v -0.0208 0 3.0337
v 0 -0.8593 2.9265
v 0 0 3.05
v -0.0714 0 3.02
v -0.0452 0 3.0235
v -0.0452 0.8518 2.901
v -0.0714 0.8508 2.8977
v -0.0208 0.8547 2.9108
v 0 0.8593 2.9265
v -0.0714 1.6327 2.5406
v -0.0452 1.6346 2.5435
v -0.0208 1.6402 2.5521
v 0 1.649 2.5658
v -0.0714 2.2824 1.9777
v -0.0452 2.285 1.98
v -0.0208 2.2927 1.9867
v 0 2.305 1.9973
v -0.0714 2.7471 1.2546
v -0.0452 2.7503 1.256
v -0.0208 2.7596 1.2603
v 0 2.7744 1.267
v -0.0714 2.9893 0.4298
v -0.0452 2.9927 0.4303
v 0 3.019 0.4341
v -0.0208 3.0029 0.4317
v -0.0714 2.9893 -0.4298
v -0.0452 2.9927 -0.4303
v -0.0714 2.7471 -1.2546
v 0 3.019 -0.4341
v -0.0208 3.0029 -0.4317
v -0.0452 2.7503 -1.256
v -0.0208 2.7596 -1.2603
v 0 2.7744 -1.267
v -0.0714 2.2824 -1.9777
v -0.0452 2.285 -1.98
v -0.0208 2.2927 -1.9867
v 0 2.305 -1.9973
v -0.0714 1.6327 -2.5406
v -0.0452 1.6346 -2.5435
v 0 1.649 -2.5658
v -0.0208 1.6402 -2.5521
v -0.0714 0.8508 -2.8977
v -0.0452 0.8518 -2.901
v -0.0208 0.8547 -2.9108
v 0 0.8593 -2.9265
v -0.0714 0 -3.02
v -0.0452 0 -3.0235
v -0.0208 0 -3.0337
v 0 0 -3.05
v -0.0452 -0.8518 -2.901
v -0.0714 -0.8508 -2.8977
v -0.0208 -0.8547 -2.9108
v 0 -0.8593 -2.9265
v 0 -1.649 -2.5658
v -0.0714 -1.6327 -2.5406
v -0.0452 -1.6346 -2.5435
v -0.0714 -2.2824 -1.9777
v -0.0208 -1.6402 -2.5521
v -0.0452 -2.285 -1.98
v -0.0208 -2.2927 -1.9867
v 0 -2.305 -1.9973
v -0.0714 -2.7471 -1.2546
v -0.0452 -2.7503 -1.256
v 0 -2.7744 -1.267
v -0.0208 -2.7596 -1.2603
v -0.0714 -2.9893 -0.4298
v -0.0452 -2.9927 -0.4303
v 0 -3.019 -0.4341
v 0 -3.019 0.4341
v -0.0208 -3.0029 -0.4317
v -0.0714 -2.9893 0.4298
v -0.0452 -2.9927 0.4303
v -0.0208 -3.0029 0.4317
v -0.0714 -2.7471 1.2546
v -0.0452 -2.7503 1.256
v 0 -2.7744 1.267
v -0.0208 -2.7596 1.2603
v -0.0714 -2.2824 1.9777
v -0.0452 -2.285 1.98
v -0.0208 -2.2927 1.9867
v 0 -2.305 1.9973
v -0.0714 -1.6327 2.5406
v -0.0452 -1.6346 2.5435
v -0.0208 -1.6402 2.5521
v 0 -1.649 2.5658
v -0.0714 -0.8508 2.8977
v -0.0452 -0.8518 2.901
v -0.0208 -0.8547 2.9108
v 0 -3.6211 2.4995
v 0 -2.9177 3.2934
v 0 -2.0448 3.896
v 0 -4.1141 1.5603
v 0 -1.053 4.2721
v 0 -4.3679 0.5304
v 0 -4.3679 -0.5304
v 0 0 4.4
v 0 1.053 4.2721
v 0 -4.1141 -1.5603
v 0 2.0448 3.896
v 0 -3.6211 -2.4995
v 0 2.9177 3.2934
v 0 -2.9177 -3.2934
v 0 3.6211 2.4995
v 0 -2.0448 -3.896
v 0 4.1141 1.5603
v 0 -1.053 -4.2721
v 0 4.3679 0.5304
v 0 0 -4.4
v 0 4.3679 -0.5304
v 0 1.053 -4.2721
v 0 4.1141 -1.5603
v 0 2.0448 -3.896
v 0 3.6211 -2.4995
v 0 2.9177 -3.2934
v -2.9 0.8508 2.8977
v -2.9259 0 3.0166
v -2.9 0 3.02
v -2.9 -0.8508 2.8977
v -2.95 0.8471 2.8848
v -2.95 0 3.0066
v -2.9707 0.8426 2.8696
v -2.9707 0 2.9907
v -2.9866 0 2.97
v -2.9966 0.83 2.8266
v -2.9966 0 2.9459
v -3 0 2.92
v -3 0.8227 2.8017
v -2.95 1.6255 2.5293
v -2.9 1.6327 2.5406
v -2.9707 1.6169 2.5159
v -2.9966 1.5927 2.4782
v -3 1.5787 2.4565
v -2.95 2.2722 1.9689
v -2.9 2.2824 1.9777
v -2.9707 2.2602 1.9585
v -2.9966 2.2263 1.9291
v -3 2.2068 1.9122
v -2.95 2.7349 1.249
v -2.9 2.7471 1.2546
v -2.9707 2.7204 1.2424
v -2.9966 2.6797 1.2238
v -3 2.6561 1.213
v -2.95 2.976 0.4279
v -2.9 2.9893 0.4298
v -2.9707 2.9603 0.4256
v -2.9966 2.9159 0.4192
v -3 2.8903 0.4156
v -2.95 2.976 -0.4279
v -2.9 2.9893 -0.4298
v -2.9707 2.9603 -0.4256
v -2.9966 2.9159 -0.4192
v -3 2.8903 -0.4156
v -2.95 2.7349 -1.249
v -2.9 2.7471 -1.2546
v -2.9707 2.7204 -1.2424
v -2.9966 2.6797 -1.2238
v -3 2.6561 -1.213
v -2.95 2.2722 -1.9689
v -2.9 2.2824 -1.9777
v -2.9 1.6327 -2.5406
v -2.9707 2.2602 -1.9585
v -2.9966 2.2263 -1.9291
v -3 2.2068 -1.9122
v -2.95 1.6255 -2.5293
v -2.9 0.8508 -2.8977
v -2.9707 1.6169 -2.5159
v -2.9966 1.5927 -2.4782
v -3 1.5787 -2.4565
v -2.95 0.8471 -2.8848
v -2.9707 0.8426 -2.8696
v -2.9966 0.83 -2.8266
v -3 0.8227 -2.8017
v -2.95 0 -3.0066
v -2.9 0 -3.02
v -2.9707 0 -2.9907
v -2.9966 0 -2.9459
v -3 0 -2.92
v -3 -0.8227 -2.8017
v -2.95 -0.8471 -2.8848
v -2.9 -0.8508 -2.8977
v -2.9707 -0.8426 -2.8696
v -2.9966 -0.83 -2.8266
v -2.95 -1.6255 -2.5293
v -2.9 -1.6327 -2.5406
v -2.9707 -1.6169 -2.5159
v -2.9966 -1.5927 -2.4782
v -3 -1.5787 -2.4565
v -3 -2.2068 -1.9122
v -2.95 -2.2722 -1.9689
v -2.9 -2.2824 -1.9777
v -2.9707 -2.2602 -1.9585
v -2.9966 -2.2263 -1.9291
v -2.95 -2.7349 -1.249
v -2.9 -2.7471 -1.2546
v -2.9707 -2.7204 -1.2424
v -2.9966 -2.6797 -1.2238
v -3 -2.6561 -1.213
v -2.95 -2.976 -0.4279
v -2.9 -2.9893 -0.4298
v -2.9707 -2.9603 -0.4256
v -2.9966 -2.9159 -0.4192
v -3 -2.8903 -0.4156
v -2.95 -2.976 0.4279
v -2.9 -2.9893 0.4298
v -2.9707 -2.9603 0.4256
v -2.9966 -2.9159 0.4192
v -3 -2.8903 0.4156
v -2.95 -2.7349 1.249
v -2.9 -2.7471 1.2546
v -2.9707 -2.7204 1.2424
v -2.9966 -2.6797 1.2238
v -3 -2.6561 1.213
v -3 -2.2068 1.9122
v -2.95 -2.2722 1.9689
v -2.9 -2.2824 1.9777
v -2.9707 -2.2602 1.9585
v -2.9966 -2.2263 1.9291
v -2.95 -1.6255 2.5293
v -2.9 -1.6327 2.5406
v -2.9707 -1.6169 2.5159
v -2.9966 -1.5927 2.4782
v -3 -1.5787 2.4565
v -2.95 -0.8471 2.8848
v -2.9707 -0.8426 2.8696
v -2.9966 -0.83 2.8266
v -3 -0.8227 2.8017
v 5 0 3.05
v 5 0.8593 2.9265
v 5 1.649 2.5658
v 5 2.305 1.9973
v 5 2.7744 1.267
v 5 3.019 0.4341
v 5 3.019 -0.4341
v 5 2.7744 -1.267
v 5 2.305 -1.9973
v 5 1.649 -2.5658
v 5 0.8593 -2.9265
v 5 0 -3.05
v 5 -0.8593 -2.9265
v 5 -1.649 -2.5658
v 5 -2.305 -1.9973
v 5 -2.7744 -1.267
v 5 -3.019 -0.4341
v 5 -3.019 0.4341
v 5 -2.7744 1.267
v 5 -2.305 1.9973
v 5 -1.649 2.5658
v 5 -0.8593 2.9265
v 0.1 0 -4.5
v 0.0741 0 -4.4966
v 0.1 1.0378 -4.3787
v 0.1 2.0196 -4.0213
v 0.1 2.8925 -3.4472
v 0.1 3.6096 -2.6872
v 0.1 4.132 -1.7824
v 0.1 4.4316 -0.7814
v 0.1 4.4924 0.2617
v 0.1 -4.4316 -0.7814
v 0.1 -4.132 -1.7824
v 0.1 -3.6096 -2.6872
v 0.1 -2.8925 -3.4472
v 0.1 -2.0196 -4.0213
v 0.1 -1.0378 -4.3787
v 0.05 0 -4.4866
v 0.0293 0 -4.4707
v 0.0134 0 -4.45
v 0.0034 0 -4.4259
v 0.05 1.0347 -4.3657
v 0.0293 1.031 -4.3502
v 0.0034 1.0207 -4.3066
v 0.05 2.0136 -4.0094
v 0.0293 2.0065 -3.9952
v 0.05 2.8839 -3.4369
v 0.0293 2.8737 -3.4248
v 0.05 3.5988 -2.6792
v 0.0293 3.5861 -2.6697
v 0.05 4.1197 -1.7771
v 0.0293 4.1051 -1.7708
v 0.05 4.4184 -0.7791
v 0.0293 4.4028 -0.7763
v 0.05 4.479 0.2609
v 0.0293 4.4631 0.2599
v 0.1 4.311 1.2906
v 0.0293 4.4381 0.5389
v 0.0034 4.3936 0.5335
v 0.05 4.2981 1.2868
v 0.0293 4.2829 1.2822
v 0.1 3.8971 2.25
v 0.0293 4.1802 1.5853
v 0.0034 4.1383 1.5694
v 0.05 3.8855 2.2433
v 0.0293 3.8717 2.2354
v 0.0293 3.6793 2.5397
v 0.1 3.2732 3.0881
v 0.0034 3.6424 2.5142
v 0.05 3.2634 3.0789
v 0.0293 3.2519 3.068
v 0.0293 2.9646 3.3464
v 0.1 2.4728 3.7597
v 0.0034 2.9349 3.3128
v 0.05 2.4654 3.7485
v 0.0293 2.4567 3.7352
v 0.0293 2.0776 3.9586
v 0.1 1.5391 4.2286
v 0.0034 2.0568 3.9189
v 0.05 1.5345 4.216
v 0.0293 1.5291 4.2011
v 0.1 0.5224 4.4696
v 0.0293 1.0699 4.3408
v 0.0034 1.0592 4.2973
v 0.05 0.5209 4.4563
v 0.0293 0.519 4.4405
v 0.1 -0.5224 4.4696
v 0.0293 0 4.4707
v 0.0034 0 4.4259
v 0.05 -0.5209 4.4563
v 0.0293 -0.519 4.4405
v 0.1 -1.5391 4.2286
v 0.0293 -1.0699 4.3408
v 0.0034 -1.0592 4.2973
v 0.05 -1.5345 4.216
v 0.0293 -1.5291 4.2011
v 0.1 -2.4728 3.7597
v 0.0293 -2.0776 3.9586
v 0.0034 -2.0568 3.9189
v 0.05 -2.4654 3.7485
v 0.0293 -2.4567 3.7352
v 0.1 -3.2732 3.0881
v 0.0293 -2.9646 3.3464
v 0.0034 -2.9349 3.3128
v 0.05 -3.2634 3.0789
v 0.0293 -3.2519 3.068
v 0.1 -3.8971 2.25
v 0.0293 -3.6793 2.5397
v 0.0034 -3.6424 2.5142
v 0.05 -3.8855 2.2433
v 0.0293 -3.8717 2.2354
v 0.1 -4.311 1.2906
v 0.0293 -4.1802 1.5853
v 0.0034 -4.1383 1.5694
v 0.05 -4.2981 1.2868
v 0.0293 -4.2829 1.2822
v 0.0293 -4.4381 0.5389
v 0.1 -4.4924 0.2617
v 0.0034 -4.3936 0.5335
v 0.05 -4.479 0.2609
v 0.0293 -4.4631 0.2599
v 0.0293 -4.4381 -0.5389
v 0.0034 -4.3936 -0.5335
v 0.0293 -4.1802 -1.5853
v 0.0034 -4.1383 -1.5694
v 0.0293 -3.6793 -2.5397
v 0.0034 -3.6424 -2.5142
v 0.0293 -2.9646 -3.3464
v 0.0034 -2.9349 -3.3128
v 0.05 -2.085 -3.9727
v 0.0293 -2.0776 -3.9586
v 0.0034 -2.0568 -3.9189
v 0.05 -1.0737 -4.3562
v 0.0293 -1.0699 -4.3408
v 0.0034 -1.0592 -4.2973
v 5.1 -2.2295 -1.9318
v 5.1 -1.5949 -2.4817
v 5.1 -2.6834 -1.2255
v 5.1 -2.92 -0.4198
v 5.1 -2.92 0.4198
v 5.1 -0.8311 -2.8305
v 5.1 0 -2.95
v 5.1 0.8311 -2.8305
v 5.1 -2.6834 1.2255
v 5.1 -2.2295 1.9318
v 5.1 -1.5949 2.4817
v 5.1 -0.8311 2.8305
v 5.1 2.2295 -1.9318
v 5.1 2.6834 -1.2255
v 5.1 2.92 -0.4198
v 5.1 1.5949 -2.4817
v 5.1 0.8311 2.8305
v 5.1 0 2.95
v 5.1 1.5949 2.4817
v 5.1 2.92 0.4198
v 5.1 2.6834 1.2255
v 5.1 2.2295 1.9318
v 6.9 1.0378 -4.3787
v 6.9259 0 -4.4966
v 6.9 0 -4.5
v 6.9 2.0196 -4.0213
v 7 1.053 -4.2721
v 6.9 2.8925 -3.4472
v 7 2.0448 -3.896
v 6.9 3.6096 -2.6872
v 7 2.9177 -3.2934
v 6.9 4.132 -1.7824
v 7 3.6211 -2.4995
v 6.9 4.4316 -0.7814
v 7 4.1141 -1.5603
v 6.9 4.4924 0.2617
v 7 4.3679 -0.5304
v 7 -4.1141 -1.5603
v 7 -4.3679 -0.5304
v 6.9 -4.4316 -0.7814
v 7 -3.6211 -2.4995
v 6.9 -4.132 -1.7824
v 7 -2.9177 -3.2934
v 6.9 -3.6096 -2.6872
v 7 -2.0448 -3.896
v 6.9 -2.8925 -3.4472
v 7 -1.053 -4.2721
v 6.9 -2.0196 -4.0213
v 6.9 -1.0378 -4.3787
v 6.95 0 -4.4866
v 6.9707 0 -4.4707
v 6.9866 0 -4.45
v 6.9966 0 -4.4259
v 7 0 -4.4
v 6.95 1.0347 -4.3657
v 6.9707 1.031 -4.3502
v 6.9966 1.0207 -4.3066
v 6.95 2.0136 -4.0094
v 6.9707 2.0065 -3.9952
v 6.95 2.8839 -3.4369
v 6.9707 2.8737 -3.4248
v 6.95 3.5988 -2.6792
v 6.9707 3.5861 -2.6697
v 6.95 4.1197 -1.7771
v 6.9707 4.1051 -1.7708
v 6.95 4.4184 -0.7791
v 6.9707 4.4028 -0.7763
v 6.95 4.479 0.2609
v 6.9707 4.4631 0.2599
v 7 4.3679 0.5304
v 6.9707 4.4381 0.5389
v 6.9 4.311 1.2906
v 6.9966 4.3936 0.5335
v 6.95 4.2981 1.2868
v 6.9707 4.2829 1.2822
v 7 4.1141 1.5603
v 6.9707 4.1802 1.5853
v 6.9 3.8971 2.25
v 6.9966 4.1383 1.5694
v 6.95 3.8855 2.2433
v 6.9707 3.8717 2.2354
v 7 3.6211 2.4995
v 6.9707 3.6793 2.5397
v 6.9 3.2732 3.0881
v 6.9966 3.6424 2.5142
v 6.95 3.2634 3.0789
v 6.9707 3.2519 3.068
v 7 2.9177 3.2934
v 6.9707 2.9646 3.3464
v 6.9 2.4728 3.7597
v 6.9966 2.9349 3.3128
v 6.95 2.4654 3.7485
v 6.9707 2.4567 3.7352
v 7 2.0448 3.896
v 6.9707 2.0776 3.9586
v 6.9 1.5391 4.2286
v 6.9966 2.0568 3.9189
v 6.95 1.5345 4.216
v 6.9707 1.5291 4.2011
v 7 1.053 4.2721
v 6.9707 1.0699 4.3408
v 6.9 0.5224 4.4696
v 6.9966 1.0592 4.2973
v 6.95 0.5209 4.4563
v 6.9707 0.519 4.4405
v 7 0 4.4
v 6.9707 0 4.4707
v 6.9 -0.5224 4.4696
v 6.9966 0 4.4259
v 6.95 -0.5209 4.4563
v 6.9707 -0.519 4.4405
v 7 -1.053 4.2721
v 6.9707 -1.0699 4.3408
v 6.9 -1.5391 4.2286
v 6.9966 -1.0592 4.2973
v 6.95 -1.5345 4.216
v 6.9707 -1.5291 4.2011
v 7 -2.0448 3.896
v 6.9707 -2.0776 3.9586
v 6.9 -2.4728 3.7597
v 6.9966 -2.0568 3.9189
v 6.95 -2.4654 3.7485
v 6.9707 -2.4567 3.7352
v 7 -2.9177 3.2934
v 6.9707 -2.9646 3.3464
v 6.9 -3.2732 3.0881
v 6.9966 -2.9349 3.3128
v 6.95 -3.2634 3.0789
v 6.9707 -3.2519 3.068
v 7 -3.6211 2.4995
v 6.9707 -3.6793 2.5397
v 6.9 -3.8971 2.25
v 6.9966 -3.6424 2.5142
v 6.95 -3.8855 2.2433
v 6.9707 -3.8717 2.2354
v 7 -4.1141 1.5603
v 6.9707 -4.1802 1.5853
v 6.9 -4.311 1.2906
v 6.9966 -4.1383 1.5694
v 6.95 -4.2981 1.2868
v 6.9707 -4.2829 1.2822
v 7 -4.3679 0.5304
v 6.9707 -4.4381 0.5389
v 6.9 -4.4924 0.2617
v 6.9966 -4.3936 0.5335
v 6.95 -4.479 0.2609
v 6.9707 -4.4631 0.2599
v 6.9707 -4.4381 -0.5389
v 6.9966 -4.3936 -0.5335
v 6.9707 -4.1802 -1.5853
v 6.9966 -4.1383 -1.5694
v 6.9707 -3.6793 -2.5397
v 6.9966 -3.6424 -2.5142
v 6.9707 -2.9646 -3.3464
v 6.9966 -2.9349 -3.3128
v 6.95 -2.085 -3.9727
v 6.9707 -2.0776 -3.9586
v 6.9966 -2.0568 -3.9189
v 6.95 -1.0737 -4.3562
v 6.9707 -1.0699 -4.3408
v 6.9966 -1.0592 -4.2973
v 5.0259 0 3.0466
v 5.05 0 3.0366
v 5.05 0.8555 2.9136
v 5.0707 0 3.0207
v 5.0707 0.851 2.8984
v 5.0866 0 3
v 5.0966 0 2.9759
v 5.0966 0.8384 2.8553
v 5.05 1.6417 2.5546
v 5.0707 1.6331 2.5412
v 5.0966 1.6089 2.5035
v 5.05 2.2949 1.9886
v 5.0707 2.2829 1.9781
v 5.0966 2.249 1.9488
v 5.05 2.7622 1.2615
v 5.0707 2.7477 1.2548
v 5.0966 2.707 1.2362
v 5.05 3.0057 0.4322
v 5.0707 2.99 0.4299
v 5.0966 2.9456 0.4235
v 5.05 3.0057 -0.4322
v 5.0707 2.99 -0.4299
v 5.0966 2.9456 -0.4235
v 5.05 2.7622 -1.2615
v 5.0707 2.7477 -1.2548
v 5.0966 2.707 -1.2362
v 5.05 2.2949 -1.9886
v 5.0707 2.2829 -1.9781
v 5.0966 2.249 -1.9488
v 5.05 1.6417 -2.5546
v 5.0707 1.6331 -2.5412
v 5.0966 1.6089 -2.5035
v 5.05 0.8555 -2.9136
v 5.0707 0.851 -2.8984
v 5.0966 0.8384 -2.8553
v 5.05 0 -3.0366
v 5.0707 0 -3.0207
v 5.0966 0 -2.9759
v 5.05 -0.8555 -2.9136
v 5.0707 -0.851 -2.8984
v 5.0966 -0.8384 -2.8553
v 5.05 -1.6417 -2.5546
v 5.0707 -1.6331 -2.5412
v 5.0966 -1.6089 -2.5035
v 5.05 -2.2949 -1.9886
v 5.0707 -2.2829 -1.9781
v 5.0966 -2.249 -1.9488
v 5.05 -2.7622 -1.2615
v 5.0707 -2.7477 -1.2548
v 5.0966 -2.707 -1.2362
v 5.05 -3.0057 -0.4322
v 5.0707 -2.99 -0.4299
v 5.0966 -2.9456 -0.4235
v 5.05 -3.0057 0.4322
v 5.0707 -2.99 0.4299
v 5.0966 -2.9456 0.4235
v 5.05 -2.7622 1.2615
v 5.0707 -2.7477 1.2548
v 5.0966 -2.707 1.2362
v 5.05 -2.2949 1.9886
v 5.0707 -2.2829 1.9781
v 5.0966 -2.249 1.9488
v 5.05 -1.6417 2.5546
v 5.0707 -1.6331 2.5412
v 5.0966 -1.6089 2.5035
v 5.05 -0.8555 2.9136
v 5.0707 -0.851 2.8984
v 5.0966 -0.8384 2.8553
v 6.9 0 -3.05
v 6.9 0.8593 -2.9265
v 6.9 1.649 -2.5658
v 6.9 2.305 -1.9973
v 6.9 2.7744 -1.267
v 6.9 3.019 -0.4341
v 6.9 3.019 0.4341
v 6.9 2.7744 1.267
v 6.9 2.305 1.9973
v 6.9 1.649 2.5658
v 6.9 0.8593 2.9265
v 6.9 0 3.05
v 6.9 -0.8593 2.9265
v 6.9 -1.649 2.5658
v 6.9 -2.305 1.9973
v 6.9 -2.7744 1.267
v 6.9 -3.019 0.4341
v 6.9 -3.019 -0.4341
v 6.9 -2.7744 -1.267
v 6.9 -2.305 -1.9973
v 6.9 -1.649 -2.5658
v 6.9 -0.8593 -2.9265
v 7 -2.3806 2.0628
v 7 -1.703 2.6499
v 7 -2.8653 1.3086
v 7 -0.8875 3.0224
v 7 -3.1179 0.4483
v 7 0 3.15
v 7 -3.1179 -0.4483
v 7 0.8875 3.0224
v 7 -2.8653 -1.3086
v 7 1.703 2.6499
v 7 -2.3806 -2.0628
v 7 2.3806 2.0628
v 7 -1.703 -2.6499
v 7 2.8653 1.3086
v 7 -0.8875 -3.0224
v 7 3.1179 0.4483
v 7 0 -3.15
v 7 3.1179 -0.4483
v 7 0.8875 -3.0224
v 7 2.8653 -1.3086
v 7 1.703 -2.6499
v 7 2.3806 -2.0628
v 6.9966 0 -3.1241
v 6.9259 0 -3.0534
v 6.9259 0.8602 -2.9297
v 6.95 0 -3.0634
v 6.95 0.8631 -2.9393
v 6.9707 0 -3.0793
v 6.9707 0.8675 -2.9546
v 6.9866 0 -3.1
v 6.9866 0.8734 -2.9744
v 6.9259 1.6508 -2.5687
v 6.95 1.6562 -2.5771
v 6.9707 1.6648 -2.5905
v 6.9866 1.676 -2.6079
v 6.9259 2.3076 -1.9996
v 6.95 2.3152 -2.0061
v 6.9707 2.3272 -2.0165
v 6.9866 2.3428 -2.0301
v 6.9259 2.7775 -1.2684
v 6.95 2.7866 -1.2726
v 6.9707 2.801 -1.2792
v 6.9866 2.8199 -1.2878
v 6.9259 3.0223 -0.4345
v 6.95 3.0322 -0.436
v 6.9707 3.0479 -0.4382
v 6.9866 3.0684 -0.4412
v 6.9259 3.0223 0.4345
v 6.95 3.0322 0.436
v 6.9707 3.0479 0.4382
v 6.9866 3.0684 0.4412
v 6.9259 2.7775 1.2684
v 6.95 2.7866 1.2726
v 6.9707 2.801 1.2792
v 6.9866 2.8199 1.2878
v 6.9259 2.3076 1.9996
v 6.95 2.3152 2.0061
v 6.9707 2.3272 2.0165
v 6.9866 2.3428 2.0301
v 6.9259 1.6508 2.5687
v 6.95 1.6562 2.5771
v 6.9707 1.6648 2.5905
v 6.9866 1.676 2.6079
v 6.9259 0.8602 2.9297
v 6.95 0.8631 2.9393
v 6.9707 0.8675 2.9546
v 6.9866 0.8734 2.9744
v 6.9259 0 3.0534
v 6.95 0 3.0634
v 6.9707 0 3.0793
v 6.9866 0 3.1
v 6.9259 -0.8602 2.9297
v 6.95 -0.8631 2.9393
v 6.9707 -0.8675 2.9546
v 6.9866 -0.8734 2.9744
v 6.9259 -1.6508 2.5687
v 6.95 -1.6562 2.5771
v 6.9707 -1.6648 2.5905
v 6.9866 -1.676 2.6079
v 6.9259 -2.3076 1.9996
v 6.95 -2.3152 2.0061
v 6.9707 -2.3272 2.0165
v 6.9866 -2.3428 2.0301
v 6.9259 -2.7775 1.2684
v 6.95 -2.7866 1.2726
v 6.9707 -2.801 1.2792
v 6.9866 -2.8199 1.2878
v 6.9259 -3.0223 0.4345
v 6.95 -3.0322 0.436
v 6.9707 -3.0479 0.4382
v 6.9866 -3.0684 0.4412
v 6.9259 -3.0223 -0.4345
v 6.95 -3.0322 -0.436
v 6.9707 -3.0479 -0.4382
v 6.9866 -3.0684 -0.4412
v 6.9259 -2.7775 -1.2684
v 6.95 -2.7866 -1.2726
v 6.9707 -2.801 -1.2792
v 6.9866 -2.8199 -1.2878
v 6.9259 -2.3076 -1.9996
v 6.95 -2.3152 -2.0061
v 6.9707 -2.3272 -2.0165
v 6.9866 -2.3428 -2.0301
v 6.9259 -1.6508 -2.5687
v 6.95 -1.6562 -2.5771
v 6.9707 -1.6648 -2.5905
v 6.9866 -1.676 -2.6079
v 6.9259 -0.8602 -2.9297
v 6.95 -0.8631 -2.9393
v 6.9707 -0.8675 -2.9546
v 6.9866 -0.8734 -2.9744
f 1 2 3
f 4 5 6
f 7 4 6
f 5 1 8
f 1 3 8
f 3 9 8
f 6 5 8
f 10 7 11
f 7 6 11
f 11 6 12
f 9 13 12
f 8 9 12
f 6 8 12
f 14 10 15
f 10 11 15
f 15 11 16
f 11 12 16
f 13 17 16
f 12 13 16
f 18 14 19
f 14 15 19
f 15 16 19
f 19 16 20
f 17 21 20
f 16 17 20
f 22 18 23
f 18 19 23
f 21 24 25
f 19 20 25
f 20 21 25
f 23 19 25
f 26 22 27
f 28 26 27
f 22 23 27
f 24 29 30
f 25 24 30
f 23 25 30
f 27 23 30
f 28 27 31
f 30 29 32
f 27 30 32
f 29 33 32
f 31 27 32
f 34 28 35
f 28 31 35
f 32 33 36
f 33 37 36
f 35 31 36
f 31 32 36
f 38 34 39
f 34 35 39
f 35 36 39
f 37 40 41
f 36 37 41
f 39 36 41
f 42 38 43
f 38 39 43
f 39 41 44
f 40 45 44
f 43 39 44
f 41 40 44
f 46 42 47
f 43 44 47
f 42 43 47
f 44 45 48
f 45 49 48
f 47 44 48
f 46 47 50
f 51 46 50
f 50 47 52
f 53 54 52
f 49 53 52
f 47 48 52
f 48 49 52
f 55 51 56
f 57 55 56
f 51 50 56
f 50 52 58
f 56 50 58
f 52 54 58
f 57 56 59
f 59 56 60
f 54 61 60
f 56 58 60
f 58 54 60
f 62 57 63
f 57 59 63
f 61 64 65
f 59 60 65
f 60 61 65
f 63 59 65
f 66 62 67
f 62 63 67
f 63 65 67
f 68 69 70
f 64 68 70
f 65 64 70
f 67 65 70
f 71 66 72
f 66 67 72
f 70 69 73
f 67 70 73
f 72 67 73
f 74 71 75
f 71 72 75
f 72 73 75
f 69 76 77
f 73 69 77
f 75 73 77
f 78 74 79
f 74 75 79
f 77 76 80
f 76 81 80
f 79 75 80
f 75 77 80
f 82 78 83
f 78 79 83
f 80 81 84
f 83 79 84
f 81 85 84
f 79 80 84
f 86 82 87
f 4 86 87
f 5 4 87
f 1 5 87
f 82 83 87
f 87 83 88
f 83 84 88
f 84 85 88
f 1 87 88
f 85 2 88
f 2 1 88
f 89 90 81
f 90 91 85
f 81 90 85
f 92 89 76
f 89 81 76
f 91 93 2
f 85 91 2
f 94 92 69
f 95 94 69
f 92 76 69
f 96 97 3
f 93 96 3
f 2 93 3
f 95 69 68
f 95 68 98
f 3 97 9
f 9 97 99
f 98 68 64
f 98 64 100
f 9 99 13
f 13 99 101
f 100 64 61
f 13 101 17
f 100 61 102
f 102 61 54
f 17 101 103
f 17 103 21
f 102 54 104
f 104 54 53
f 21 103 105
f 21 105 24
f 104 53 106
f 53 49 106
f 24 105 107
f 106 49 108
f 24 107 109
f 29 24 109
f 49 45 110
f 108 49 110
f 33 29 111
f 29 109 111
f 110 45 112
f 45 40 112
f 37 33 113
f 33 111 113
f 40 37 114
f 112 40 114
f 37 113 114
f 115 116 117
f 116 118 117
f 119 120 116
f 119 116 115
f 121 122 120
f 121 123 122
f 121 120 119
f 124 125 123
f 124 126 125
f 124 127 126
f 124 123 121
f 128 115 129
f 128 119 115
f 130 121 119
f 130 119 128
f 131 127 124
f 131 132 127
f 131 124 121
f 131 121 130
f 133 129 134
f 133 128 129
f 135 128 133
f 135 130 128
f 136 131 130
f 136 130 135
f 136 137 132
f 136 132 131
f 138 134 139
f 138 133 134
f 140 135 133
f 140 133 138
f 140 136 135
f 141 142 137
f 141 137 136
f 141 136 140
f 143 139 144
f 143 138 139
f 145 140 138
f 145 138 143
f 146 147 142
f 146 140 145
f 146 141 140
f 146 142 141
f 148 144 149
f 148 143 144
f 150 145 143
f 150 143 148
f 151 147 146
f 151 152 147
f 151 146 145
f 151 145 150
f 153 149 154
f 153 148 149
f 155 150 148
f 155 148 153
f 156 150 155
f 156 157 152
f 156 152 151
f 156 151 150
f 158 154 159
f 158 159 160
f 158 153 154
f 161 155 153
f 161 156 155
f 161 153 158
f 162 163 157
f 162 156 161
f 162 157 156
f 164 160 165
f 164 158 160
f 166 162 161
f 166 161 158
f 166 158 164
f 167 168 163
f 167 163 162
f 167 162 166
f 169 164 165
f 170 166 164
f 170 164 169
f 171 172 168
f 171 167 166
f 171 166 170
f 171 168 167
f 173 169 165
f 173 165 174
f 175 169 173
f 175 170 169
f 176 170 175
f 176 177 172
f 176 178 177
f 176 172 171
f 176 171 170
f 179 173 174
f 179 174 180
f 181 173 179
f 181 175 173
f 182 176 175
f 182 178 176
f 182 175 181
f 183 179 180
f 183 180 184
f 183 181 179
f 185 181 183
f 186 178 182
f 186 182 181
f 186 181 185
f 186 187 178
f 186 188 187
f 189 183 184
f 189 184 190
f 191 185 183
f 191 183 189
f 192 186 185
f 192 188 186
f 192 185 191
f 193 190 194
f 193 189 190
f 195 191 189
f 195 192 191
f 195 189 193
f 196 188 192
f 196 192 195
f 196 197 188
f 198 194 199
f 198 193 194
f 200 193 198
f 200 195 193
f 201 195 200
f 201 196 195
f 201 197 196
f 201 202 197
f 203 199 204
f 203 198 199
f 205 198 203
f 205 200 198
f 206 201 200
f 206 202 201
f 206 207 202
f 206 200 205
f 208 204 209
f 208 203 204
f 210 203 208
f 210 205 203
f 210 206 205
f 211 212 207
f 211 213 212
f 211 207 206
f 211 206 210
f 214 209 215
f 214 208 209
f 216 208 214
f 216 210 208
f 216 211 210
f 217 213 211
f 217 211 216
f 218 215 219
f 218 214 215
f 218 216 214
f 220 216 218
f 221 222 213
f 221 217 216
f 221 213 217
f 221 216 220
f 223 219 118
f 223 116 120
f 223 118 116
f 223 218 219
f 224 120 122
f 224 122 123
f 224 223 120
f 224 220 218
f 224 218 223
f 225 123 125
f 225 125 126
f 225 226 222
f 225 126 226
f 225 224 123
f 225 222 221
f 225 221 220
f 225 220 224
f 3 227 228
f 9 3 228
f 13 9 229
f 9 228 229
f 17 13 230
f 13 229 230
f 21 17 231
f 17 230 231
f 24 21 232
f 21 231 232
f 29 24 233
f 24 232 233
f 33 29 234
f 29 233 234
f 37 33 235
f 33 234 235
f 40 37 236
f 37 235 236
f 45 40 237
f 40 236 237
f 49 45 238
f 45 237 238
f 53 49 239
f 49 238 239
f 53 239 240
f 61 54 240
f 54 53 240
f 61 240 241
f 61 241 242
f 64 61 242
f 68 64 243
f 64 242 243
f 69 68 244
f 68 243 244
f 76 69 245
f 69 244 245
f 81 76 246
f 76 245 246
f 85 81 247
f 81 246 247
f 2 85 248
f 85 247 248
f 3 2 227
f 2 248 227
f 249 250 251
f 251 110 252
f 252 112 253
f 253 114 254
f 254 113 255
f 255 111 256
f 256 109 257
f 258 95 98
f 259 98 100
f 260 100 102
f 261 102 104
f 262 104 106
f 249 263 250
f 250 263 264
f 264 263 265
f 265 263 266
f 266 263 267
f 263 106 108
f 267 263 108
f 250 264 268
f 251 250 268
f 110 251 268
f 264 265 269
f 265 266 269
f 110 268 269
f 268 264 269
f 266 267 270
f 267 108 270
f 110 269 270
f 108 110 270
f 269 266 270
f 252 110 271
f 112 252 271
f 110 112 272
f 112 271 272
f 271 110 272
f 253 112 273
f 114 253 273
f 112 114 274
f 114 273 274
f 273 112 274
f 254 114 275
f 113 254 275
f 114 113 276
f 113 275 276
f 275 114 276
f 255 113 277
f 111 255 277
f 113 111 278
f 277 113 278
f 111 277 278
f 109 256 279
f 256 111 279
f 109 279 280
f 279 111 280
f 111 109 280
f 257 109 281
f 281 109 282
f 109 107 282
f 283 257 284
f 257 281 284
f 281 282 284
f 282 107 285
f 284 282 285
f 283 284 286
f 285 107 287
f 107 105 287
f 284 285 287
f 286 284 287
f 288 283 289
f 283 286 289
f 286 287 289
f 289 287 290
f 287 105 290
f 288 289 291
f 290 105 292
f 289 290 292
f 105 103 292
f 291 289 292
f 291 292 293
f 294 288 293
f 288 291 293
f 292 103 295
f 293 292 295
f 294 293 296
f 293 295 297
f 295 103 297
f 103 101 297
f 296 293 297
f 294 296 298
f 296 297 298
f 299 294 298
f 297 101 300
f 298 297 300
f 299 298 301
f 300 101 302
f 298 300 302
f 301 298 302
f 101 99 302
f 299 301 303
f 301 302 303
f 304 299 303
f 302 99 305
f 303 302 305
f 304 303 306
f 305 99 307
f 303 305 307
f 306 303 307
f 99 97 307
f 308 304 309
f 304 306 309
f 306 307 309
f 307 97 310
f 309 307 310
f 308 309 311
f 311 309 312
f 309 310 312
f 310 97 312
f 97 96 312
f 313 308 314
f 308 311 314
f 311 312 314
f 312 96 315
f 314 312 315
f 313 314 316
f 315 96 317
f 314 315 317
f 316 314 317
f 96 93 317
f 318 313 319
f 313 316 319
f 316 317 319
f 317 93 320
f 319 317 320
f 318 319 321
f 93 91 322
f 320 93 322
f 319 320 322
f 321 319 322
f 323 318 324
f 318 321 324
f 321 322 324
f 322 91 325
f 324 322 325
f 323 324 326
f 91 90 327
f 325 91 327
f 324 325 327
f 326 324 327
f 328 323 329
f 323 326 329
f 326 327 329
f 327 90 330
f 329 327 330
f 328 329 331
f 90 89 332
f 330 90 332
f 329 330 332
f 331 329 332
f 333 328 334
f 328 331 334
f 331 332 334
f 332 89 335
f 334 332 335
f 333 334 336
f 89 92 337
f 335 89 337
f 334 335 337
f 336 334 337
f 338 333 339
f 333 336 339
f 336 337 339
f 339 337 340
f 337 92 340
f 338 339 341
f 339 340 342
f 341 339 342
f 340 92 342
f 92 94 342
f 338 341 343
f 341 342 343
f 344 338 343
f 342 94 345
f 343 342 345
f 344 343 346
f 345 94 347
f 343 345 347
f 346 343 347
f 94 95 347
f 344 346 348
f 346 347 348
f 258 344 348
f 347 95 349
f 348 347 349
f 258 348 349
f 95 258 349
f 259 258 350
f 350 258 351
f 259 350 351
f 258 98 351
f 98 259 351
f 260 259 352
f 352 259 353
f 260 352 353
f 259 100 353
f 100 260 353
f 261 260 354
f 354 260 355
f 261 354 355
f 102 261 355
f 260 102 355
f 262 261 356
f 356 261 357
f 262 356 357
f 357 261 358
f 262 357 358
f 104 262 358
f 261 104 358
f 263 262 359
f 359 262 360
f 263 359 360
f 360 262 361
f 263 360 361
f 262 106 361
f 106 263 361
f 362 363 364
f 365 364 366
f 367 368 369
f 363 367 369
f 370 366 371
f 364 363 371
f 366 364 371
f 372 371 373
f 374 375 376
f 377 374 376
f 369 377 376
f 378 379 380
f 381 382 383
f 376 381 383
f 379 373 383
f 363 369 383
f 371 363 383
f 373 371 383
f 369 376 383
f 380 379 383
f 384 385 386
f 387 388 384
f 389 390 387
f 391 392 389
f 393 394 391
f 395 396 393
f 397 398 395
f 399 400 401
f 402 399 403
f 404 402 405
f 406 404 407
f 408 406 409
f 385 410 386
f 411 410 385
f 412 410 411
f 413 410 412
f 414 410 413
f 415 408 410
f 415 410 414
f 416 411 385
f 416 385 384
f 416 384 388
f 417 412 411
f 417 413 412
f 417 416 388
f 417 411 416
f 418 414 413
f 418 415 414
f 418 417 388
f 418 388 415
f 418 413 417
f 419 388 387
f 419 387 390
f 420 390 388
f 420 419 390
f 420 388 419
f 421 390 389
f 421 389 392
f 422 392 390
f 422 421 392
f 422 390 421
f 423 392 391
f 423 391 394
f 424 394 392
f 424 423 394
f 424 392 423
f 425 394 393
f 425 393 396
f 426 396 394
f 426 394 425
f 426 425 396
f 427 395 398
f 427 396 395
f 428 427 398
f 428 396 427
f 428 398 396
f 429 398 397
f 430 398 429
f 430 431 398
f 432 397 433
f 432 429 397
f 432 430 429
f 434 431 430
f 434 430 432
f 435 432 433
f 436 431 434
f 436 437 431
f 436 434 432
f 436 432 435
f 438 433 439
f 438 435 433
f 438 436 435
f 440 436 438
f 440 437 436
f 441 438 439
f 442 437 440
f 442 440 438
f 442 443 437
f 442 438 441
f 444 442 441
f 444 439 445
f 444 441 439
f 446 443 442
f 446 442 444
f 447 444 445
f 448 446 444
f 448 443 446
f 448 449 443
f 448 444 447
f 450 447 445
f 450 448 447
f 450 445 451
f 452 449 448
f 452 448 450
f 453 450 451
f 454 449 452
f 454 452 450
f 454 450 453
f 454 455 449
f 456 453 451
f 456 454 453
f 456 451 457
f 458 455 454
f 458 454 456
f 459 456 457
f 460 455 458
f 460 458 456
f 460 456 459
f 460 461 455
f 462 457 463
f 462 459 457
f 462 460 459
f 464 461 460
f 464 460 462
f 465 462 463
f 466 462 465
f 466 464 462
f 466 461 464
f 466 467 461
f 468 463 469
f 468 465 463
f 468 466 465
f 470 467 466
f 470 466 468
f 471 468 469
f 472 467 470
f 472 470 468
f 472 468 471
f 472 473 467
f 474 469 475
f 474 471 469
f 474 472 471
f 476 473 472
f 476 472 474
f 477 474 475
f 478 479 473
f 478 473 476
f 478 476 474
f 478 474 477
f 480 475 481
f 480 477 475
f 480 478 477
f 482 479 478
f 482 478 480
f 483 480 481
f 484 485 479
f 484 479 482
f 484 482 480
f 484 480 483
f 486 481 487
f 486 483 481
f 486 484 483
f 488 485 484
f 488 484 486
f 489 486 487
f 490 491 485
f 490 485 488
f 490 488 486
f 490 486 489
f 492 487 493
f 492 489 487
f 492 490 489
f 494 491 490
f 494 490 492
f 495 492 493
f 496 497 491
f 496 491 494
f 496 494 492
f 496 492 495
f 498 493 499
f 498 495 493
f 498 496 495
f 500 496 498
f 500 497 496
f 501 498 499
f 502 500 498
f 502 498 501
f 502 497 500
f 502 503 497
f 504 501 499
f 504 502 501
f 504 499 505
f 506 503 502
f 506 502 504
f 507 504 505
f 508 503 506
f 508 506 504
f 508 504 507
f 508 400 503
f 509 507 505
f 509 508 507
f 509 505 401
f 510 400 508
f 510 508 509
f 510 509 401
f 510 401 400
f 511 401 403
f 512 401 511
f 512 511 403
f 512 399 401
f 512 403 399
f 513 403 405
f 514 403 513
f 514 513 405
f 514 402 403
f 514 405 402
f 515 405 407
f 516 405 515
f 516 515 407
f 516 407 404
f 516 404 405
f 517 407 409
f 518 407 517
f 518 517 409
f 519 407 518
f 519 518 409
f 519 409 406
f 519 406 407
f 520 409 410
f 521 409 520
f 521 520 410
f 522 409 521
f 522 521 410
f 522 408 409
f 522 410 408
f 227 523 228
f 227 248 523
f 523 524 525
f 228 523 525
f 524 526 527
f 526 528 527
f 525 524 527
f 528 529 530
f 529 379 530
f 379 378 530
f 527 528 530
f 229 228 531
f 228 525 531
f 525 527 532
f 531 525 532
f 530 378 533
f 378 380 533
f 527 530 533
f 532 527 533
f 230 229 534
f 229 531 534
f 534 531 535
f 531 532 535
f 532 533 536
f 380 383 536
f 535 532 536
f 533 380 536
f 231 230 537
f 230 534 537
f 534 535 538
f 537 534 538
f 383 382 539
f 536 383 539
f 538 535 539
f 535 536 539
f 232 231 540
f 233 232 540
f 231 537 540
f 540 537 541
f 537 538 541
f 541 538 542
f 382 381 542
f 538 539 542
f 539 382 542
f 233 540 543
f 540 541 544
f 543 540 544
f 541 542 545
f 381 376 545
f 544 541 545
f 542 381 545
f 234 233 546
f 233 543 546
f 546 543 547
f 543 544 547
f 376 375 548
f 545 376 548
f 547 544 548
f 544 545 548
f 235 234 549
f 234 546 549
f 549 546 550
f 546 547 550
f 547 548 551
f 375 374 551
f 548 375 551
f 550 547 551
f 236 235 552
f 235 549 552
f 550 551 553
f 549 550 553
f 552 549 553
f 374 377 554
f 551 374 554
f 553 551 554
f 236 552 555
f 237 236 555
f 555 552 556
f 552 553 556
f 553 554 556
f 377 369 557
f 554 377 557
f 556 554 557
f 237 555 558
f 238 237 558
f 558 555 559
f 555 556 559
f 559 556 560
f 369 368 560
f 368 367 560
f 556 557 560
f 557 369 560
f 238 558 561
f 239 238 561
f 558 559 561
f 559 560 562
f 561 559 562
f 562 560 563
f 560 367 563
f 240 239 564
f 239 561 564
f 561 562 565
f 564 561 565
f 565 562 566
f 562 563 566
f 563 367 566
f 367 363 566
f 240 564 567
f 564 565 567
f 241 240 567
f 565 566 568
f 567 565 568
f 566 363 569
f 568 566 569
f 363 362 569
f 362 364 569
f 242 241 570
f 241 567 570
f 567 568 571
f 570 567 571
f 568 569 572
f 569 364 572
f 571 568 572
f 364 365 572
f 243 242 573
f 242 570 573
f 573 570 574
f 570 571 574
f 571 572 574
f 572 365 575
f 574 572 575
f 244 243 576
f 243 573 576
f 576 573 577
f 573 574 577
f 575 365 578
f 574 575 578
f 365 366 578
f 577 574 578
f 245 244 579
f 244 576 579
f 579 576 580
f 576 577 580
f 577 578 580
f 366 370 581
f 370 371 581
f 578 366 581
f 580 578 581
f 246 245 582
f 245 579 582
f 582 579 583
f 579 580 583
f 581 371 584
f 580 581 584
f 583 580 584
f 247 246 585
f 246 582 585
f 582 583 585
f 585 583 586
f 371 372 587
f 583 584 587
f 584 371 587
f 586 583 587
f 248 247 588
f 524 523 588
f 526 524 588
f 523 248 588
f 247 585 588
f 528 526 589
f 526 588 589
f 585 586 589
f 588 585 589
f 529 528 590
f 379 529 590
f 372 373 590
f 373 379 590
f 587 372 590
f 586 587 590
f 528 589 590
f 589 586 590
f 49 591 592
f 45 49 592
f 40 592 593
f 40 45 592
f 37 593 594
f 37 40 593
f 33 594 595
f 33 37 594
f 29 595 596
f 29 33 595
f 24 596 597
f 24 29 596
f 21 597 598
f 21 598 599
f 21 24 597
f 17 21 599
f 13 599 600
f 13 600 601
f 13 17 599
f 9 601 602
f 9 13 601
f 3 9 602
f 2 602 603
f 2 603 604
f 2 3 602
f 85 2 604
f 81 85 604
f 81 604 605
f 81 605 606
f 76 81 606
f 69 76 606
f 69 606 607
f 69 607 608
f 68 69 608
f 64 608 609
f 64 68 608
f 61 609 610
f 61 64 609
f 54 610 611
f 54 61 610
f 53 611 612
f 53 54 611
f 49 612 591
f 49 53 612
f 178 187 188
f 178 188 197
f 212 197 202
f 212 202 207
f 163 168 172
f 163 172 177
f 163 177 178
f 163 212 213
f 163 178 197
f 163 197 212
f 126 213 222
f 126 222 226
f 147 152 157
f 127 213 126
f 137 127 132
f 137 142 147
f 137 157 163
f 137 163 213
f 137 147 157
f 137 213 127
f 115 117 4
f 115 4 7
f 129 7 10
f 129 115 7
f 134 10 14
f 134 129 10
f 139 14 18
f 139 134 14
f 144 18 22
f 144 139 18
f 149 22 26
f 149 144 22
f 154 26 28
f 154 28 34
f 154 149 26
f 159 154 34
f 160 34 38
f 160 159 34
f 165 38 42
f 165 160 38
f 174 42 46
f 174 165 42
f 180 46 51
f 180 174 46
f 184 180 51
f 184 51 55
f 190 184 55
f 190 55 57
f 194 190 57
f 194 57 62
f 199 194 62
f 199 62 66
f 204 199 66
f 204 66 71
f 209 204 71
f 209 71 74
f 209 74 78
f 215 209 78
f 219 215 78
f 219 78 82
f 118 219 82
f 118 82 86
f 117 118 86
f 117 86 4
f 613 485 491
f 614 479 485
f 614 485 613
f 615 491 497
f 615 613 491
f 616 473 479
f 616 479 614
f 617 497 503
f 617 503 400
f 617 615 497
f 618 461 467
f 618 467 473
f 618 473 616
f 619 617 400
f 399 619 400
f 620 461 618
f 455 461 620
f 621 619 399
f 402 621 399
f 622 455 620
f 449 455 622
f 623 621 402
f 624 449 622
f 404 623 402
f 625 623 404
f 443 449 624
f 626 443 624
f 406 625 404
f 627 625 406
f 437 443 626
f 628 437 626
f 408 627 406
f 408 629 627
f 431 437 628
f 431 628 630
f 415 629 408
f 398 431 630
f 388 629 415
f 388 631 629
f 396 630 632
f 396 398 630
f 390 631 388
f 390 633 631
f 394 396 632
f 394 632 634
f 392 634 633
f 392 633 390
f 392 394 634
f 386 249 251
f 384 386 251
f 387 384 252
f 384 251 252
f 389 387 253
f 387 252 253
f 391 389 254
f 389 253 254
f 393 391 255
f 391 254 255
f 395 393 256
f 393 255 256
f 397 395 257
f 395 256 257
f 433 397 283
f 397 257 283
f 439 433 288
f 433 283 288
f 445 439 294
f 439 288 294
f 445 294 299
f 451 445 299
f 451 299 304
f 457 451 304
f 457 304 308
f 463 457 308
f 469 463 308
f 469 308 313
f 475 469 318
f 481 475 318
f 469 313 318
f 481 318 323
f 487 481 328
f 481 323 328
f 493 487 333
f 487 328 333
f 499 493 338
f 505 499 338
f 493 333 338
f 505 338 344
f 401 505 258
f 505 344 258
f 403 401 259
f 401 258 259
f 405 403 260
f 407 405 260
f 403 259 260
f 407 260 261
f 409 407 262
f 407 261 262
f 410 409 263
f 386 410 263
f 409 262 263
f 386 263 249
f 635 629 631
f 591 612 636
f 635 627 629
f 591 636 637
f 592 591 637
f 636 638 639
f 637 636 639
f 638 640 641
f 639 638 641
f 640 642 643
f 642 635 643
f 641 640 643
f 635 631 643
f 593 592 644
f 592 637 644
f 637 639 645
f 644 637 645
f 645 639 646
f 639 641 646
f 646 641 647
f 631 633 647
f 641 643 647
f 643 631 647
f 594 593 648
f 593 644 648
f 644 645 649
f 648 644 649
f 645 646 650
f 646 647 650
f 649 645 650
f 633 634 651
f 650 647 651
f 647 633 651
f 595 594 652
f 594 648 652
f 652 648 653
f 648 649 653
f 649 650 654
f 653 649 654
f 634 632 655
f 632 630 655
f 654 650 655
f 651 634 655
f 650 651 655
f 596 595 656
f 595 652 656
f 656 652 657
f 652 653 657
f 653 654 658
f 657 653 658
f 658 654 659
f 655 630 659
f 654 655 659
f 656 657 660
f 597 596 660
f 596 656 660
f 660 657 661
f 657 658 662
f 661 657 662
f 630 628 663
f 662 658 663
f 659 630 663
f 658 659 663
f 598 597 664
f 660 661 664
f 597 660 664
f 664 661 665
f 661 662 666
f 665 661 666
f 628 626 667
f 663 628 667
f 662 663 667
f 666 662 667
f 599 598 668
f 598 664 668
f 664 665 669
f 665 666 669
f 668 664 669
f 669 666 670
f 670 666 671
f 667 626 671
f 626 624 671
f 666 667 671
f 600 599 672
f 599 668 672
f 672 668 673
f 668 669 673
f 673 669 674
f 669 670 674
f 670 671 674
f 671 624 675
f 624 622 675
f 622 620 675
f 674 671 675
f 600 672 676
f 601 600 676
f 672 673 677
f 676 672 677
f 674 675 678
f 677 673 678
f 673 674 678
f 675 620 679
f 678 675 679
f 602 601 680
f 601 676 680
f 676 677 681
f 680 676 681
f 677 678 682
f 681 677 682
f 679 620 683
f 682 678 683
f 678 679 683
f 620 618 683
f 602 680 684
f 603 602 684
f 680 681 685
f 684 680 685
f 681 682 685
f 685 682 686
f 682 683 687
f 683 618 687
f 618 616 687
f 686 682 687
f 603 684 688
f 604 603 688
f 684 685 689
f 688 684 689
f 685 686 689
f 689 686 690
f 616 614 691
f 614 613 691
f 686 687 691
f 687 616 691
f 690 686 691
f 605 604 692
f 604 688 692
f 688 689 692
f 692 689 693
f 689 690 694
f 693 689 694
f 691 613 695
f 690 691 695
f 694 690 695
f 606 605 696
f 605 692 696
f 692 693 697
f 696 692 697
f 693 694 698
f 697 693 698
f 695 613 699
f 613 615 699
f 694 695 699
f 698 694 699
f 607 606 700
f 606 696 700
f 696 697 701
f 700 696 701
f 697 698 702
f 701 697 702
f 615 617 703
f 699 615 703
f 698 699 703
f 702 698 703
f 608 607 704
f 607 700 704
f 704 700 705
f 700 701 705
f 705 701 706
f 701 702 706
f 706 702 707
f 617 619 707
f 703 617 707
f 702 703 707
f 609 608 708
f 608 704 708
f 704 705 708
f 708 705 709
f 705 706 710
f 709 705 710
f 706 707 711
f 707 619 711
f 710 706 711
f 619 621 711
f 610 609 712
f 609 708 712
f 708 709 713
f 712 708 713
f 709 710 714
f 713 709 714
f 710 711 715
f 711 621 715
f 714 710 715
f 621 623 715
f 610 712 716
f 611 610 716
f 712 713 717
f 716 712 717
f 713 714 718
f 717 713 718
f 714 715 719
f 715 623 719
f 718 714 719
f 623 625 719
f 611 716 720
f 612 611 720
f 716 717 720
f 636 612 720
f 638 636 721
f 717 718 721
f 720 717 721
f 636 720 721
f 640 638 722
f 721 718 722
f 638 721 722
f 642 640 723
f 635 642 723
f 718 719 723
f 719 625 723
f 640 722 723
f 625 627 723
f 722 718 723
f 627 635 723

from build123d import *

# Parameters (mm, degrees)
SKETCH_1_R           = 4.5
SKETCH_1_R_2         = 3.05
EXTRUDE_1_DEPTH      = 7
EXTRUDE_2_DEPTH      = 3
EXTRUDE_2_DEPTH_BACK = 5.1
SKETCH_2_R           = 3.05
SKETCH_3_R           = 3.05
SKETCH_3_R_2         = 3.02
CUT_EXTRUDE_1_DEPTH  = 3
FILLET_1_R           = 0.1
FILLET_2_R           = 0.1
FILLET_3_R           = 0.1
FILLET_4_R           = 0.1


with BuildPart() as part:
    # 草图1 → 凸台-拉伸1 (new body)
    with BuildSketch(Plane(origin=(0, 0, 0), x_dir=(0, 0, -1), z_dir=(1, 0, 0))):
        Circle(SKETCH_1_R)
        Circle(SKETCH_1_R_2, mode=Mode.SUBTRACT)
    extrude(amount=EXTRUDE_1_DEPTH)

    # 圆角1
    fillet_1_edges = [part.edges().sort_by_distance(p)[0] for p in [
        (0, 0, 4.5),
        (7, 0, 4.5),
        (7, 0, 3.05),
    ]]
    fillet(fillet_1_edges, radius=FILLET_1_R)


with BuildPart() as body_2:
    # 草图2 → 凸台-拉伸2 (new, two sides: drawn at the far end of the back side and taken through both)
    with BuildSketch(Plane.ZY.offset(-EXTRUDE_2_DEPTH_BACK)):
        Circle(SKETCH_2_R)
    extrude(amount=EXTRUDE_2_DEPTH + EXTRUDE_2_DEPTH_BACK)

    # 草图3 → 切除-拉伸1 (cut)
    with BuildSketch(Plane.ZY.offset(3)):
        with Locations(Location((0, 0, 0), (0, 0, 180))):
            Circle(SKETCH_3_R)
        Circle(SKETCH_3_R_2, mode=Mode.SUBTRACT)
    extrude(amount=-CUT_EXTRUDE_1_DEPTH, mode=Mode.SUBTRACT)

    # 圆角2
    fillet_2_edges = [body_2.edges().sort_by_distance(p)[0] for p in [
        (-3, 0, -3.02),
    ]]
    fillet(fillet_2_edges, radius=FILLET_2_R)

    # 圆角3
    # the kernel refuses this fillet: 0.1 mm, written as the material it adds along each edge
    with BuildSketch(Plane(origin=(0, 0, 0), x_dir=(0, 0, 1), z_dir=(0, -1, 0))) as fillet_3_piece_1:
        with BuildLine():
            CenterArc((3.12, 0.071414284), FILLET_3_R, 180, 45.572995999)
            Line((3.05, 0), (3.0486, -0.001428286))
            ThreePointArc((3.0486, -0.001428286), (3.035, -0.002), (3.02, -0.002))
            Line((3.02, -0.002), (3.018, 0))
            Line((3.018, 0), (3.018, 0.071414284))
            Line((3.018, 0.071414284), (3.02, 0.071414284))
        make_face()
    revolve(axis=Axis((0, 0, 0), (-1, 0, 0)))

    # 圆角4
    fillet_4_edges = [body_2.edges().sort_by_distance(p)[0] for p in [
        (5.1, 0, -3.05),
    ]]
    fillet(fillet_4_edges, radius=FILLET_4_R)


solid = Compound([part.part, body_2.part])
